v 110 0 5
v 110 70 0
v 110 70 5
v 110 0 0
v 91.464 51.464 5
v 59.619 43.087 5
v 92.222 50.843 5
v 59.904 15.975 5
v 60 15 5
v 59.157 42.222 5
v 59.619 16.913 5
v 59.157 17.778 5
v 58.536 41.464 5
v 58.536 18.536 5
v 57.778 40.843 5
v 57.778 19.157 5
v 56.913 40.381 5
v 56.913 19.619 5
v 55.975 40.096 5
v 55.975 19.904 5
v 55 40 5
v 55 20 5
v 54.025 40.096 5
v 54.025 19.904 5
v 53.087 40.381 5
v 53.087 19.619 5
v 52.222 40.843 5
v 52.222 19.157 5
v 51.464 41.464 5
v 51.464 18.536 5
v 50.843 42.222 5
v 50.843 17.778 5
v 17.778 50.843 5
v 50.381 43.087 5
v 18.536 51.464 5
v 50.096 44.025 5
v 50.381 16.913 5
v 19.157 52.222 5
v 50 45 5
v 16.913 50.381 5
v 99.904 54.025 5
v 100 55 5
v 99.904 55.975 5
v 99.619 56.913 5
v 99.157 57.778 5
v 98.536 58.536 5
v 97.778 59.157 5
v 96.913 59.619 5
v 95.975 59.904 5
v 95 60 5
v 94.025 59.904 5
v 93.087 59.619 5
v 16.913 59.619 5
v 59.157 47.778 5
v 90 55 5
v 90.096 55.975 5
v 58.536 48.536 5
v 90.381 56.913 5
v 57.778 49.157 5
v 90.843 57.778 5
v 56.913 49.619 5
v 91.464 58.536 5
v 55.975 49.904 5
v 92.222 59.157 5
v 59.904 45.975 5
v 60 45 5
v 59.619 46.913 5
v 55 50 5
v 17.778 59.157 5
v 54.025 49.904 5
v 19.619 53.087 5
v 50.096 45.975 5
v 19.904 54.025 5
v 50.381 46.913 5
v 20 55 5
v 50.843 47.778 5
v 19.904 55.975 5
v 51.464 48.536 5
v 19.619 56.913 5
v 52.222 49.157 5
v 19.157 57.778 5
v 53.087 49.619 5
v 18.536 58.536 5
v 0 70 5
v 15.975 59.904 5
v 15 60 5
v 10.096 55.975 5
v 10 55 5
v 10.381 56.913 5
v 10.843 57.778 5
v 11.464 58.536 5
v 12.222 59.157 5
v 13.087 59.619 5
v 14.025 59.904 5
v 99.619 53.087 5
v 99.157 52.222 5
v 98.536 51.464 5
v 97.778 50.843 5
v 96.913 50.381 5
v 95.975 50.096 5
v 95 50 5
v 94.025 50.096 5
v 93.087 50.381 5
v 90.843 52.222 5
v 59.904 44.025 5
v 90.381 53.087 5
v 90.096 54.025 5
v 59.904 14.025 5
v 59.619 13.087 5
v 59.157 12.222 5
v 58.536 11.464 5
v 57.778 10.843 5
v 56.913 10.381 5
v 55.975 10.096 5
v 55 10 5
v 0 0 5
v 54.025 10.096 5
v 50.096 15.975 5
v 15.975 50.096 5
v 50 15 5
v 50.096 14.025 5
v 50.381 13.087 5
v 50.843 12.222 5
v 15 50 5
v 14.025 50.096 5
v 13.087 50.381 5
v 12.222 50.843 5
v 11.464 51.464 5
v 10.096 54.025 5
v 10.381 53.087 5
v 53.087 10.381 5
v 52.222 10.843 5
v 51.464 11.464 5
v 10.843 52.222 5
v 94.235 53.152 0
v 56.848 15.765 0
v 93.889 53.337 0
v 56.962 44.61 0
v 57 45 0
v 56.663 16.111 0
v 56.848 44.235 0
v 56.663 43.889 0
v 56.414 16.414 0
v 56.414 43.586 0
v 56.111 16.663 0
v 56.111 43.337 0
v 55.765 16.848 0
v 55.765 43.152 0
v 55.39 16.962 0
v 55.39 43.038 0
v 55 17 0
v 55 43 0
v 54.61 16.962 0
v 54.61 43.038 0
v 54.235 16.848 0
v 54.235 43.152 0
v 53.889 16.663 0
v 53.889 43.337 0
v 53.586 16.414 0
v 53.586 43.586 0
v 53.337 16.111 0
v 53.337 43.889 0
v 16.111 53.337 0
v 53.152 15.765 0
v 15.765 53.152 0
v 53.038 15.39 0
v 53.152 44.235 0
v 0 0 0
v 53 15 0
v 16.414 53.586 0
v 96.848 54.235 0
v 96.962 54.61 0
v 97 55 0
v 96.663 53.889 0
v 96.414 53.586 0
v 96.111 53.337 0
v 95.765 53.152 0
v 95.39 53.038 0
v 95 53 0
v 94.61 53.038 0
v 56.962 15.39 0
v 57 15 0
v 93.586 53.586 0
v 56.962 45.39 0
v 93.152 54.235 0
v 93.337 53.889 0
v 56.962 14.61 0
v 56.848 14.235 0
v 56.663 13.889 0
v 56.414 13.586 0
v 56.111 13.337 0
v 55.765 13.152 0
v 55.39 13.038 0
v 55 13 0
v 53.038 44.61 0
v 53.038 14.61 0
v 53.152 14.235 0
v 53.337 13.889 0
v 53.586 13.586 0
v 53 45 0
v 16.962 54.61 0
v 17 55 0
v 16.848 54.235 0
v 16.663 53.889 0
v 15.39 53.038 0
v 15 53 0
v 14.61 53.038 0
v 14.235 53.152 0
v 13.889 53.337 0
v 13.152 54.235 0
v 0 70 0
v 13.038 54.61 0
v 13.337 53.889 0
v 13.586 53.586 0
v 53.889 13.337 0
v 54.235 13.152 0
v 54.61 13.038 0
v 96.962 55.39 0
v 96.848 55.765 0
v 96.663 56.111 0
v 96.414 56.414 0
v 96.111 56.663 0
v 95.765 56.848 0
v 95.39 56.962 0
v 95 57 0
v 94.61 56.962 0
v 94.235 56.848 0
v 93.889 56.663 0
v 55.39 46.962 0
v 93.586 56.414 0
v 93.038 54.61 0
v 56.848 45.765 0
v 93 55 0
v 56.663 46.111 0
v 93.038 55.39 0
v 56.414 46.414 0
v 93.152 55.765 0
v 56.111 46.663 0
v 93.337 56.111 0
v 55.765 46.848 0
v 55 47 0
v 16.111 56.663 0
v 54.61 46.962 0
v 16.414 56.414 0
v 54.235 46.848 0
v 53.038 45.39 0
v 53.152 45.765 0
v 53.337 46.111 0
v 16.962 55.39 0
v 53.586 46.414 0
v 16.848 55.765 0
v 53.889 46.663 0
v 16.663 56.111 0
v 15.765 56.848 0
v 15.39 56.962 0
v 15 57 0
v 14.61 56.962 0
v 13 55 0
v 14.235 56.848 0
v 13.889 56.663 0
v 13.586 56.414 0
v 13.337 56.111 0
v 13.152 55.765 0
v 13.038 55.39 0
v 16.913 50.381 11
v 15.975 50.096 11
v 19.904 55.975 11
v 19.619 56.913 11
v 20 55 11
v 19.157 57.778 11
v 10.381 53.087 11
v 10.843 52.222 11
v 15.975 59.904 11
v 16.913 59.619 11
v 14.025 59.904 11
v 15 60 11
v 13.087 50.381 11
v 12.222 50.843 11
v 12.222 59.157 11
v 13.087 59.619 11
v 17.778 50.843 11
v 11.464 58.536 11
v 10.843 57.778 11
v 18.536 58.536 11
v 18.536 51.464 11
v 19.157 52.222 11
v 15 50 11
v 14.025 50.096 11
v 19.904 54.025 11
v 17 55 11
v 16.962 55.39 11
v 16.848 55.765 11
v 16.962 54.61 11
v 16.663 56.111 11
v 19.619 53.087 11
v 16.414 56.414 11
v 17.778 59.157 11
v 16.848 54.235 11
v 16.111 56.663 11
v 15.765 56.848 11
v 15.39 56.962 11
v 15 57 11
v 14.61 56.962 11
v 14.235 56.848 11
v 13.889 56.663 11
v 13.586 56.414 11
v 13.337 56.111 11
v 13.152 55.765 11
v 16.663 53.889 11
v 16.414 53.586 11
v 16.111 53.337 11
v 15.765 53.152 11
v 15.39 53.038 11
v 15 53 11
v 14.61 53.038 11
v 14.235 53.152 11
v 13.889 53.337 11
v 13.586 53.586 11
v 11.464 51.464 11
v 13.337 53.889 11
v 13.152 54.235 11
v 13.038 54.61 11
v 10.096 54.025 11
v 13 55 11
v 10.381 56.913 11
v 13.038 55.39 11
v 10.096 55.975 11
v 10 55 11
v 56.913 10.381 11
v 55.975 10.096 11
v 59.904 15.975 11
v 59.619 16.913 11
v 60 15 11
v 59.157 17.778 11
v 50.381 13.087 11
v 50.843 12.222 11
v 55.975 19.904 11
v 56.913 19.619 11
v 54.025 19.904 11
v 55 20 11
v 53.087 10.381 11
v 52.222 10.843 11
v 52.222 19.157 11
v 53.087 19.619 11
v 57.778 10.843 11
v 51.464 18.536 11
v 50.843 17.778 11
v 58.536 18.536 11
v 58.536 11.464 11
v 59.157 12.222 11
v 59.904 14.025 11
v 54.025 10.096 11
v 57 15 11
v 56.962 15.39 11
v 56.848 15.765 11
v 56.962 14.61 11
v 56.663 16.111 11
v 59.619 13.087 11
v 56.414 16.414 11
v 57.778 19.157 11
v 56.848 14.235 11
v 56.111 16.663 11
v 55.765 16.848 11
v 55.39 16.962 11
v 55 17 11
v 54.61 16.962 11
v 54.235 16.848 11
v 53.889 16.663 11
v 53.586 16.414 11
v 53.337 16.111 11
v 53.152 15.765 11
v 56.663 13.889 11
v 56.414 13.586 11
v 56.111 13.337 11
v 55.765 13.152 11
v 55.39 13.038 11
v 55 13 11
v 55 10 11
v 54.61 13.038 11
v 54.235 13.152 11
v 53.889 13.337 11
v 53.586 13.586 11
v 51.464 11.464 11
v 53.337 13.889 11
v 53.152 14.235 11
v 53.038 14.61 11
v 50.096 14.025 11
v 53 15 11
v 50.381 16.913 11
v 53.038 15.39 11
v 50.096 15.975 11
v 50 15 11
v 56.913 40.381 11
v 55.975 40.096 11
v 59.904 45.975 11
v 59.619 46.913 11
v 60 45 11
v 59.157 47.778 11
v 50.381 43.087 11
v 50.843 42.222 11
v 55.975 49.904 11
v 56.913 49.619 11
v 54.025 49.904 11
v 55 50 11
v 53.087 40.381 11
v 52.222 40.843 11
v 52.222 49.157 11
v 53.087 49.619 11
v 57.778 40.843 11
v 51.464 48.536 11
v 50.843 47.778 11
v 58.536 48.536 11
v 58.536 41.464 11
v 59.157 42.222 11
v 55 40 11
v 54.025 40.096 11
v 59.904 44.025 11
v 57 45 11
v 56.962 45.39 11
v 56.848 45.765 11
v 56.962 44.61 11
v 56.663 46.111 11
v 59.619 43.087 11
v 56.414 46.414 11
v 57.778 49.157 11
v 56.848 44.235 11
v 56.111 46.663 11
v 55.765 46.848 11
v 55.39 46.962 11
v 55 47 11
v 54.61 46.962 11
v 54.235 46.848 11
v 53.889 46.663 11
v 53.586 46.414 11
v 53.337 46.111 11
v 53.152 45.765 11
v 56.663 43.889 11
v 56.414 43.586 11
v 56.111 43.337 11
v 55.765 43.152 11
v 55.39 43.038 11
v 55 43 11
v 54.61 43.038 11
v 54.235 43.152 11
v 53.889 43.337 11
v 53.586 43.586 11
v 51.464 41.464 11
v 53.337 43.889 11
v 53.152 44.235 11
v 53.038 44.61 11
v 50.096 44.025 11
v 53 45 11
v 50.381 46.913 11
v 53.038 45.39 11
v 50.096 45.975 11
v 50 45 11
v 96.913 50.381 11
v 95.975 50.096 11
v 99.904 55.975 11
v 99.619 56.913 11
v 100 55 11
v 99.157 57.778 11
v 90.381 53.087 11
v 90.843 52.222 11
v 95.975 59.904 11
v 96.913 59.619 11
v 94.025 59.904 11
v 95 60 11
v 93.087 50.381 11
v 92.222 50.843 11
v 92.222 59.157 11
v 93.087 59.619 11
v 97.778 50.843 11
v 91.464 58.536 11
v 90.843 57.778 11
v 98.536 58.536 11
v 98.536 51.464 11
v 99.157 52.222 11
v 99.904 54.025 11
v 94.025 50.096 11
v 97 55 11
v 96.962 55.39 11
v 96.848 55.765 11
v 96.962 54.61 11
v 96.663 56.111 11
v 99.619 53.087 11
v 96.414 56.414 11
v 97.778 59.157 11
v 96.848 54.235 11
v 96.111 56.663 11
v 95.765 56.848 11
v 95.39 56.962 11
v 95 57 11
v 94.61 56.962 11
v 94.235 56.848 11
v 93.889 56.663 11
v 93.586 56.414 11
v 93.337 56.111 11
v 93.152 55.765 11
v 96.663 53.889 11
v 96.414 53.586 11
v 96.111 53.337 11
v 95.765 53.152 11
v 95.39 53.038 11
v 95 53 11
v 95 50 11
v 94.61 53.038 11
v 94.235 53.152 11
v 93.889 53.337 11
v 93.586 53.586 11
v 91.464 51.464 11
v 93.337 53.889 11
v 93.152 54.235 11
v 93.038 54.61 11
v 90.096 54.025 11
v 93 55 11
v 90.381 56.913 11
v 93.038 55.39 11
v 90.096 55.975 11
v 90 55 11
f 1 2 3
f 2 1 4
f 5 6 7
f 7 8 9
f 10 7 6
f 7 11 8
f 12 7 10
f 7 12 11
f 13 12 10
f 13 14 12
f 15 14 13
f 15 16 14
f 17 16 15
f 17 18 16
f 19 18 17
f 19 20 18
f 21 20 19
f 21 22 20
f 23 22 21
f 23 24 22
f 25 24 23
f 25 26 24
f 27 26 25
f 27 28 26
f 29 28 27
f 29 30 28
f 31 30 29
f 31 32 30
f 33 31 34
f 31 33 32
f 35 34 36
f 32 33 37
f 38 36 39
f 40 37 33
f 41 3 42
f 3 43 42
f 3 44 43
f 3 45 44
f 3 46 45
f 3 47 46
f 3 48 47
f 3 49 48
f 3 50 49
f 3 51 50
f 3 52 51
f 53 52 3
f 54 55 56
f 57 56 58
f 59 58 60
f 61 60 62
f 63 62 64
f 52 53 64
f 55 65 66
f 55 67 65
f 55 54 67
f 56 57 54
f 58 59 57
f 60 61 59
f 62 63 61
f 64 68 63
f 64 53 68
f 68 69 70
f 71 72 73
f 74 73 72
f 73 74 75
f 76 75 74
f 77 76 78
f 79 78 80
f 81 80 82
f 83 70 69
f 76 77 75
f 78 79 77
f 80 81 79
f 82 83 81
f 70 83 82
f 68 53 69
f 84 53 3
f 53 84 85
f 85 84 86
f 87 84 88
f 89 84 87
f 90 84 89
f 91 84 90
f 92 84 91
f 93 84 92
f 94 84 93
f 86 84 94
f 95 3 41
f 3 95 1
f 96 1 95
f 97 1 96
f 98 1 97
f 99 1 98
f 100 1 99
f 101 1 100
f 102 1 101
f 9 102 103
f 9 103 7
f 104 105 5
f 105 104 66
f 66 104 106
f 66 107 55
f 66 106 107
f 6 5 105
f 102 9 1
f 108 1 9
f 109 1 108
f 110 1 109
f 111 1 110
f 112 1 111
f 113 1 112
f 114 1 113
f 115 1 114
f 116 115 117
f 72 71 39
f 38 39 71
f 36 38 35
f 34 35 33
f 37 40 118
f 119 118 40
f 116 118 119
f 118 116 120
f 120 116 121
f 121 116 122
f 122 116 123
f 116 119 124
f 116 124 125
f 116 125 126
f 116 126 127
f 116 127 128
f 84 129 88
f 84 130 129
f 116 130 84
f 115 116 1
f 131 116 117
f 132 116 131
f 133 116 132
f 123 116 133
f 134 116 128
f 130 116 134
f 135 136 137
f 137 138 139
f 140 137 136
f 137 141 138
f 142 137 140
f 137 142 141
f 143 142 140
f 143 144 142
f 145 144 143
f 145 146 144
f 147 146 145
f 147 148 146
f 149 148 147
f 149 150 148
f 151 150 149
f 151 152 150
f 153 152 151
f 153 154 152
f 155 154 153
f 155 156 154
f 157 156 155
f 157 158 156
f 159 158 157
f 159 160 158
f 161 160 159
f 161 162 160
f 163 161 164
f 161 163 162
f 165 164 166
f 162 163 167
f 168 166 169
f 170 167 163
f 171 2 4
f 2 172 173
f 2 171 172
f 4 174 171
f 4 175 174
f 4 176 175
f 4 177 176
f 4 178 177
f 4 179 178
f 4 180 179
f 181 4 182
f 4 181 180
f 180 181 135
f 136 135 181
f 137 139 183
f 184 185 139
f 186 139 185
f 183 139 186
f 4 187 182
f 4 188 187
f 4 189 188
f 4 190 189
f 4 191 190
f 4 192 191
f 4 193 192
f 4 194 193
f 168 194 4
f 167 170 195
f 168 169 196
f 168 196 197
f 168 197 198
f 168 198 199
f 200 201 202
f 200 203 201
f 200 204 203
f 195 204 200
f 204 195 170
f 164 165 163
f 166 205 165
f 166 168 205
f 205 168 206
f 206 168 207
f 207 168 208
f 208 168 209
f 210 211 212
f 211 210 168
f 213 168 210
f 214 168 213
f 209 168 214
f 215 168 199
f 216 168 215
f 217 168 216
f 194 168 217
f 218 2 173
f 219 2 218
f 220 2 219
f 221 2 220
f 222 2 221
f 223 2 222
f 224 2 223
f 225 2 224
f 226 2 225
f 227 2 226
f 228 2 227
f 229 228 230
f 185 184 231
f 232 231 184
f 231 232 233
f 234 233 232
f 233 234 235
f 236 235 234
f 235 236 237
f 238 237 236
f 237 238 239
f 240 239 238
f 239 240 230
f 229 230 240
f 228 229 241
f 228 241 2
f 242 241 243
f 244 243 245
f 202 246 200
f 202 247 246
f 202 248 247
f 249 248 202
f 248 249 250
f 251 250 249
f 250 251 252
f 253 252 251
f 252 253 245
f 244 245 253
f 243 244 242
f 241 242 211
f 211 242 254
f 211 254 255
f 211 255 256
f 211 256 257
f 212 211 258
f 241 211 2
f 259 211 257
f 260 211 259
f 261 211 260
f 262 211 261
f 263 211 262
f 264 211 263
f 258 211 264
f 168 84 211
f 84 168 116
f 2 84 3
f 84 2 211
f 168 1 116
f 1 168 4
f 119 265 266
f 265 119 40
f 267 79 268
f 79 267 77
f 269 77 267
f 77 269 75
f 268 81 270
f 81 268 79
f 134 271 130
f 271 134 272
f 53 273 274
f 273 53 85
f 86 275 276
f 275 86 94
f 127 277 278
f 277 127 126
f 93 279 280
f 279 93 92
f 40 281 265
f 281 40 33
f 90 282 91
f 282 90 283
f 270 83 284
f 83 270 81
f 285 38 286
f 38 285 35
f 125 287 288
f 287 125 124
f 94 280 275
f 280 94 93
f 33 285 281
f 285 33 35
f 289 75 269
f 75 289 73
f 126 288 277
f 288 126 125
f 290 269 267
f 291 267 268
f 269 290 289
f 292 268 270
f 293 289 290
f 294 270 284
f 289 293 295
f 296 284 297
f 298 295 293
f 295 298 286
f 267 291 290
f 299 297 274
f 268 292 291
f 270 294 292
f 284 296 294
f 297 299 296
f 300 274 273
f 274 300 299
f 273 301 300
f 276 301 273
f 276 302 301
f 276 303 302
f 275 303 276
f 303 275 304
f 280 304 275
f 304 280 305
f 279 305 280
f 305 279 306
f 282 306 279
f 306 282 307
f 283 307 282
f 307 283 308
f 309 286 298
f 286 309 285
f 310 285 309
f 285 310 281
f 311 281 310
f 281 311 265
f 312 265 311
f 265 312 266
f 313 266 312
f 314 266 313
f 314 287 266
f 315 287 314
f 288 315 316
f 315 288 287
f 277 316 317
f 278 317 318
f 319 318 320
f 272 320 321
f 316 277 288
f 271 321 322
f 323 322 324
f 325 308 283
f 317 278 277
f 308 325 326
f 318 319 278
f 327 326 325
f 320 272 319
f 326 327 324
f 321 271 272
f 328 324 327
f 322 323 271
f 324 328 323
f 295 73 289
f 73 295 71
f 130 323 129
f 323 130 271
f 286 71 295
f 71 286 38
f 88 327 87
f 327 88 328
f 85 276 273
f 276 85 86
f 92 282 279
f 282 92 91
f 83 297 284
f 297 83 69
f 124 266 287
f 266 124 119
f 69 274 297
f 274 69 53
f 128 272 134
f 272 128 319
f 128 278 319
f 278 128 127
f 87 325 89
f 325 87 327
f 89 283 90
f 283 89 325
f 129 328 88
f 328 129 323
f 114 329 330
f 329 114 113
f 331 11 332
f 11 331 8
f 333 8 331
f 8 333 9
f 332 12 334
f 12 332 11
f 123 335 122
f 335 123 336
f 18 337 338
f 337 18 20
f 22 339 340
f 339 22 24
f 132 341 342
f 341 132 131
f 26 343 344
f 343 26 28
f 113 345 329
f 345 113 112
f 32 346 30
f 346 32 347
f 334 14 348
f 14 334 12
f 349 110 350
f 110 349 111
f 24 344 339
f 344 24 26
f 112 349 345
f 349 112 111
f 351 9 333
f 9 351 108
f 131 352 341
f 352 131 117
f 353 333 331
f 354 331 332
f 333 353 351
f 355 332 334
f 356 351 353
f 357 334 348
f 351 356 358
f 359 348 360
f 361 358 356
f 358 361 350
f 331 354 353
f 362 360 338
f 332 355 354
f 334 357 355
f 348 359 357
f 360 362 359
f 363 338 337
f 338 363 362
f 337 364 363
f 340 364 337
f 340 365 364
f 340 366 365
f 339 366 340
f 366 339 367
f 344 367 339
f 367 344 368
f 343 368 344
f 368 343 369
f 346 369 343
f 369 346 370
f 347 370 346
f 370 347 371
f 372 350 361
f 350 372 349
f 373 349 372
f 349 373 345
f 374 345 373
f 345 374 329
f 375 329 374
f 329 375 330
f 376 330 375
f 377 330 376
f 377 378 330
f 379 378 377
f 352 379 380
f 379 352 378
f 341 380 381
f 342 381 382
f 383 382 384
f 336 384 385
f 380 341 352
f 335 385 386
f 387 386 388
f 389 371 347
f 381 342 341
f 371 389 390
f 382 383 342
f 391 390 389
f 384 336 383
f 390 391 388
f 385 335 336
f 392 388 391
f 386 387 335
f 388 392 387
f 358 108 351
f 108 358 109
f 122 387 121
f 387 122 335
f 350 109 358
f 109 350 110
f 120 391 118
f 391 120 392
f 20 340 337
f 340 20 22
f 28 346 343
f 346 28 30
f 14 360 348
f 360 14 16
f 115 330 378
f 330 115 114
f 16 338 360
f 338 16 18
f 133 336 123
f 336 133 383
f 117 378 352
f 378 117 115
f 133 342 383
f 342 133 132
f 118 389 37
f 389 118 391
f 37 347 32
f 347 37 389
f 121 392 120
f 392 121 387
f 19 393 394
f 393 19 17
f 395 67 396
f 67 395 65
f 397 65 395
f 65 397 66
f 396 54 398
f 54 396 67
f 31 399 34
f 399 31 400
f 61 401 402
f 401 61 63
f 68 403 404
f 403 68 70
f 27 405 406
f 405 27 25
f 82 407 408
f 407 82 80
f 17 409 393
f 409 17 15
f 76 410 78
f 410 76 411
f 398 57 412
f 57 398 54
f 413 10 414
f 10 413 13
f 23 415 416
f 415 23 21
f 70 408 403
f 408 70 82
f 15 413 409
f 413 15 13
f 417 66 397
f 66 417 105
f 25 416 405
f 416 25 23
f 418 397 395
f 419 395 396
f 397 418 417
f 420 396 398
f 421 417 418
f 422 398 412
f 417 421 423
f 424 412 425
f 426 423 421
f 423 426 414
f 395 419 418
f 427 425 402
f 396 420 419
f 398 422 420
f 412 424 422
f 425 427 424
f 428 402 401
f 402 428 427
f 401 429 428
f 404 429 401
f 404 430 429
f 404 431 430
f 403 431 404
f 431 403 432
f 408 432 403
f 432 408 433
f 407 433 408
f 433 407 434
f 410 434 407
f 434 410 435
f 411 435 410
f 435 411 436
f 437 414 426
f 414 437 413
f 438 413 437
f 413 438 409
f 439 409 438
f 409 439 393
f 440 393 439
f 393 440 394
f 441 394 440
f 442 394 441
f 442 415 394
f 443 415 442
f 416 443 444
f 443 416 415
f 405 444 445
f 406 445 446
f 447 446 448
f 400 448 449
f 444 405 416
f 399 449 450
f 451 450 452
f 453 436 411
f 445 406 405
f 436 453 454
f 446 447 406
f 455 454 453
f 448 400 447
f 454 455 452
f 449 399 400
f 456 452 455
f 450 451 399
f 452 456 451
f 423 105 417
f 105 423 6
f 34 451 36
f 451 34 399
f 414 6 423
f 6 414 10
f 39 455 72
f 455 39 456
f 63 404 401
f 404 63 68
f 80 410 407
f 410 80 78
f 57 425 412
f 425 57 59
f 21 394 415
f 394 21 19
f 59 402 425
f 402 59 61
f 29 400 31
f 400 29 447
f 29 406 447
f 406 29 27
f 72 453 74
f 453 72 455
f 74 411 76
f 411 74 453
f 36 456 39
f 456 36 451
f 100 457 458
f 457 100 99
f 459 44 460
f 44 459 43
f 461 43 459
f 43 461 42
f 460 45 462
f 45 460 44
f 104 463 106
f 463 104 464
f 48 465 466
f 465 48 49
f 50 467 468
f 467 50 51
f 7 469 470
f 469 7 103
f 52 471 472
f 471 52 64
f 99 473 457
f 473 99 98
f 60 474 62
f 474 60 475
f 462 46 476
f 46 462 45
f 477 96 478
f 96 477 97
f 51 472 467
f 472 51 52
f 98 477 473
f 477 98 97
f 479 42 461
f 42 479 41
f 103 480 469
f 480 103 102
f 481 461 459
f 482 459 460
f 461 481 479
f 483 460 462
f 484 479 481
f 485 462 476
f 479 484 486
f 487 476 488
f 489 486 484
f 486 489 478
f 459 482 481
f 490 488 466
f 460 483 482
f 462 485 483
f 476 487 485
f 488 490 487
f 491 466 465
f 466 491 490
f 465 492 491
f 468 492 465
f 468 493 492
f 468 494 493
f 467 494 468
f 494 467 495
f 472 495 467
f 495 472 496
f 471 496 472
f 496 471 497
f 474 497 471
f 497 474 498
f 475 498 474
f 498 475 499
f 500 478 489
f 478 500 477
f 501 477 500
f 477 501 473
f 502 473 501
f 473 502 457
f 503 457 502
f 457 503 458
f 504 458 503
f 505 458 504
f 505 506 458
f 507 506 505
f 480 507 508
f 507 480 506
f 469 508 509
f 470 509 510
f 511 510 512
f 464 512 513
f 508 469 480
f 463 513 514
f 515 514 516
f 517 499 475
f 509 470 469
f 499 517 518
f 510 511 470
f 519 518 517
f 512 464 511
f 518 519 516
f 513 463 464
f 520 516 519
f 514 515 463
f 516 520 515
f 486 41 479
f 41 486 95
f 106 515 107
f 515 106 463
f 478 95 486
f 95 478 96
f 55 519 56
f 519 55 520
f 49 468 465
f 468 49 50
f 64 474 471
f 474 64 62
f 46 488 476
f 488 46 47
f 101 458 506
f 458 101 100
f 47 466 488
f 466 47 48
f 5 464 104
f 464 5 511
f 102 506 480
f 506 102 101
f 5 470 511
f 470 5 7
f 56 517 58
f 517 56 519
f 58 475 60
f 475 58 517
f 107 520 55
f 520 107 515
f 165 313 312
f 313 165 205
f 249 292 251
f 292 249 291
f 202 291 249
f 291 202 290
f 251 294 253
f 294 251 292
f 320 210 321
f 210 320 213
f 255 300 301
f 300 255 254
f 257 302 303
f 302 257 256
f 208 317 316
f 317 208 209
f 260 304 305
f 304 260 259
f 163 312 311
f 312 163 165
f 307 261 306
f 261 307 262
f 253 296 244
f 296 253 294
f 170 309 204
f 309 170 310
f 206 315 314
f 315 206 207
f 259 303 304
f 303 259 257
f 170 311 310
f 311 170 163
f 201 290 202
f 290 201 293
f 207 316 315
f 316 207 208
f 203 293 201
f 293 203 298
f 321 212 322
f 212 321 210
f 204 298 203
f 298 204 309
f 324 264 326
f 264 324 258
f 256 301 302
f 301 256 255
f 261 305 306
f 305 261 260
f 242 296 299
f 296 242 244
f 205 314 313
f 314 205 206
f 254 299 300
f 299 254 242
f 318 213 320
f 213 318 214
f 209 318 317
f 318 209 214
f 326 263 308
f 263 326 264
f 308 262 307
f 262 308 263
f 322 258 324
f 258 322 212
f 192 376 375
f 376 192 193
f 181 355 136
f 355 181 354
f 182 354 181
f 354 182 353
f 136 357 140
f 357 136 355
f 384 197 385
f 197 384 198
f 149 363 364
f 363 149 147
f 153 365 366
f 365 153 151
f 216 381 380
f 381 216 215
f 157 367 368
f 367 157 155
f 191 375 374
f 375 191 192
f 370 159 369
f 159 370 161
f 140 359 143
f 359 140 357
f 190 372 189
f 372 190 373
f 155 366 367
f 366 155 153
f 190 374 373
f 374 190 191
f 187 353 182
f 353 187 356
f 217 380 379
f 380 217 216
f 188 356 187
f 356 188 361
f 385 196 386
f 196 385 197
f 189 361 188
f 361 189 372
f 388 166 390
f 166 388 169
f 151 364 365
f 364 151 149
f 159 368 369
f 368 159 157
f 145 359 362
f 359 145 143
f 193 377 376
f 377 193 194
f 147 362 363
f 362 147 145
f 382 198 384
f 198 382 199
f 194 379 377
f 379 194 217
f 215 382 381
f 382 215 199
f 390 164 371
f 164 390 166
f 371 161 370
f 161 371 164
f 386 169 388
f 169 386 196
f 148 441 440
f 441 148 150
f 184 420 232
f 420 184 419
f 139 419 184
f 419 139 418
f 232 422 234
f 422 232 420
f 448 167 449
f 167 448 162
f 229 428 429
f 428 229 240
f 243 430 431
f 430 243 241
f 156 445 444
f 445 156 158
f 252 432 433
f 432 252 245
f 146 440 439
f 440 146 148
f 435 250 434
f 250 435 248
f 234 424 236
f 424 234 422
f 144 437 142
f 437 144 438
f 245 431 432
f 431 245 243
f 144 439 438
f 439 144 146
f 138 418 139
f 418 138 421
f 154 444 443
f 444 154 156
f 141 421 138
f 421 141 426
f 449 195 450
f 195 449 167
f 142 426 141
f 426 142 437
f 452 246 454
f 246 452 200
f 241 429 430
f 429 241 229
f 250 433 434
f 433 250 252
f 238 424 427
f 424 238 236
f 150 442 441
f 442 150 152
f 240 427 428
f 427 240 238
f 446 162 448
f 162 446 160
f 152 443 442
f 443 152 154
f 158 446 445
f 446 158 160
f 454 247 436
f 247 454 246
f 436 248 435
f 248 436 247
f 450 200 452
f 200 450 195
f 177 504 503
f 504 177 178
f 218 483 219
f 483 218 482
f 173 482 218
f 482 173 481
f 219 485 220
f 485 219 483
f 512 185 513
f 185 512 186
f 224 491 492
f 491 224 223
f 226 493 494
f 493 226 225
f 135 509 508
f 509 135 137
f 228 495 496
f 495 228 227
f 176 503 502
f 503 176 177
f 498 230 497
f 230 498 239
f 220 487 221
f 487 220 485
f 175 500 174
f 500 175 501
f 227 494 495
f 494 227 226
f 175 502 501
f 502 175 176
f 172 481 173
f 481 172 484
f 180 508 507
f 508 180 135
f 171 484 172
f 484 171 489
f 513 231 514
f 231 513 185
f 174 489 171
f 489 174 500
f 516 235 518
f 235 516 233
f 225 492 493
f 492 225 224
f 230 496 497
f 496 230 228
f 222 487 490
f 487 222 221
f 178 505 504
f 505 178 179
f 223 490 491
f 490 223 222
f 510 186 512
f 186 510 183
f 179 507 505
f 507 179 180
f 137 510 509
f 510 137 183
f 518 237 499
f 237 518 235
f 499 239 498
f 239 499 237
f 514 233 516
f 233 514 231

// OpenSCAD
$fn = 32;

// ----------------------------------------------------------------------
// Boss field: plate with bosses at given coordinates
// ----------------------------------------------------------------------

// --- parameters (mm) ---
plate_l = 110;            // plate length, X
plate_w = 70;             // plate width, Y
plate_t = 5;              // plate thickness, Z
boss_d = 10;              // boss diameter
boss_h = 6;               // boss height above the plate
bore_d = 4;               // boss bore

total_h = plate_t + boss_h;  // overall height

difference() {
  union() {
    cube([plate_l, plate_w, plate_t]);
    translate([15, 55, plate_t]) cylinder(h = boss_h, d = boss_d);
    translate([55, 15, plate_t]) cylinder(h = boss_h, d = boss_d);
    translate([55, 45, plate_t]) cylinder(h = boss_h, d = boss_d);
    translate([95, 55, plate_t]) cylinder(h = boss_h, d = boss_d);
  }
  translate([15, 55, -1]) cylinder(h = total_h + 2, d = bore_d);
  translate([55, 15, -1]) cylinder(h = total_h + 2, d = bore_d);
  translate([55, 45, -1]) cylinder(h = total_h + 2, d = bore_d);
  translate([95, 55, -1]) cylinder(h = total_h + 2, d = bore_d);
}
